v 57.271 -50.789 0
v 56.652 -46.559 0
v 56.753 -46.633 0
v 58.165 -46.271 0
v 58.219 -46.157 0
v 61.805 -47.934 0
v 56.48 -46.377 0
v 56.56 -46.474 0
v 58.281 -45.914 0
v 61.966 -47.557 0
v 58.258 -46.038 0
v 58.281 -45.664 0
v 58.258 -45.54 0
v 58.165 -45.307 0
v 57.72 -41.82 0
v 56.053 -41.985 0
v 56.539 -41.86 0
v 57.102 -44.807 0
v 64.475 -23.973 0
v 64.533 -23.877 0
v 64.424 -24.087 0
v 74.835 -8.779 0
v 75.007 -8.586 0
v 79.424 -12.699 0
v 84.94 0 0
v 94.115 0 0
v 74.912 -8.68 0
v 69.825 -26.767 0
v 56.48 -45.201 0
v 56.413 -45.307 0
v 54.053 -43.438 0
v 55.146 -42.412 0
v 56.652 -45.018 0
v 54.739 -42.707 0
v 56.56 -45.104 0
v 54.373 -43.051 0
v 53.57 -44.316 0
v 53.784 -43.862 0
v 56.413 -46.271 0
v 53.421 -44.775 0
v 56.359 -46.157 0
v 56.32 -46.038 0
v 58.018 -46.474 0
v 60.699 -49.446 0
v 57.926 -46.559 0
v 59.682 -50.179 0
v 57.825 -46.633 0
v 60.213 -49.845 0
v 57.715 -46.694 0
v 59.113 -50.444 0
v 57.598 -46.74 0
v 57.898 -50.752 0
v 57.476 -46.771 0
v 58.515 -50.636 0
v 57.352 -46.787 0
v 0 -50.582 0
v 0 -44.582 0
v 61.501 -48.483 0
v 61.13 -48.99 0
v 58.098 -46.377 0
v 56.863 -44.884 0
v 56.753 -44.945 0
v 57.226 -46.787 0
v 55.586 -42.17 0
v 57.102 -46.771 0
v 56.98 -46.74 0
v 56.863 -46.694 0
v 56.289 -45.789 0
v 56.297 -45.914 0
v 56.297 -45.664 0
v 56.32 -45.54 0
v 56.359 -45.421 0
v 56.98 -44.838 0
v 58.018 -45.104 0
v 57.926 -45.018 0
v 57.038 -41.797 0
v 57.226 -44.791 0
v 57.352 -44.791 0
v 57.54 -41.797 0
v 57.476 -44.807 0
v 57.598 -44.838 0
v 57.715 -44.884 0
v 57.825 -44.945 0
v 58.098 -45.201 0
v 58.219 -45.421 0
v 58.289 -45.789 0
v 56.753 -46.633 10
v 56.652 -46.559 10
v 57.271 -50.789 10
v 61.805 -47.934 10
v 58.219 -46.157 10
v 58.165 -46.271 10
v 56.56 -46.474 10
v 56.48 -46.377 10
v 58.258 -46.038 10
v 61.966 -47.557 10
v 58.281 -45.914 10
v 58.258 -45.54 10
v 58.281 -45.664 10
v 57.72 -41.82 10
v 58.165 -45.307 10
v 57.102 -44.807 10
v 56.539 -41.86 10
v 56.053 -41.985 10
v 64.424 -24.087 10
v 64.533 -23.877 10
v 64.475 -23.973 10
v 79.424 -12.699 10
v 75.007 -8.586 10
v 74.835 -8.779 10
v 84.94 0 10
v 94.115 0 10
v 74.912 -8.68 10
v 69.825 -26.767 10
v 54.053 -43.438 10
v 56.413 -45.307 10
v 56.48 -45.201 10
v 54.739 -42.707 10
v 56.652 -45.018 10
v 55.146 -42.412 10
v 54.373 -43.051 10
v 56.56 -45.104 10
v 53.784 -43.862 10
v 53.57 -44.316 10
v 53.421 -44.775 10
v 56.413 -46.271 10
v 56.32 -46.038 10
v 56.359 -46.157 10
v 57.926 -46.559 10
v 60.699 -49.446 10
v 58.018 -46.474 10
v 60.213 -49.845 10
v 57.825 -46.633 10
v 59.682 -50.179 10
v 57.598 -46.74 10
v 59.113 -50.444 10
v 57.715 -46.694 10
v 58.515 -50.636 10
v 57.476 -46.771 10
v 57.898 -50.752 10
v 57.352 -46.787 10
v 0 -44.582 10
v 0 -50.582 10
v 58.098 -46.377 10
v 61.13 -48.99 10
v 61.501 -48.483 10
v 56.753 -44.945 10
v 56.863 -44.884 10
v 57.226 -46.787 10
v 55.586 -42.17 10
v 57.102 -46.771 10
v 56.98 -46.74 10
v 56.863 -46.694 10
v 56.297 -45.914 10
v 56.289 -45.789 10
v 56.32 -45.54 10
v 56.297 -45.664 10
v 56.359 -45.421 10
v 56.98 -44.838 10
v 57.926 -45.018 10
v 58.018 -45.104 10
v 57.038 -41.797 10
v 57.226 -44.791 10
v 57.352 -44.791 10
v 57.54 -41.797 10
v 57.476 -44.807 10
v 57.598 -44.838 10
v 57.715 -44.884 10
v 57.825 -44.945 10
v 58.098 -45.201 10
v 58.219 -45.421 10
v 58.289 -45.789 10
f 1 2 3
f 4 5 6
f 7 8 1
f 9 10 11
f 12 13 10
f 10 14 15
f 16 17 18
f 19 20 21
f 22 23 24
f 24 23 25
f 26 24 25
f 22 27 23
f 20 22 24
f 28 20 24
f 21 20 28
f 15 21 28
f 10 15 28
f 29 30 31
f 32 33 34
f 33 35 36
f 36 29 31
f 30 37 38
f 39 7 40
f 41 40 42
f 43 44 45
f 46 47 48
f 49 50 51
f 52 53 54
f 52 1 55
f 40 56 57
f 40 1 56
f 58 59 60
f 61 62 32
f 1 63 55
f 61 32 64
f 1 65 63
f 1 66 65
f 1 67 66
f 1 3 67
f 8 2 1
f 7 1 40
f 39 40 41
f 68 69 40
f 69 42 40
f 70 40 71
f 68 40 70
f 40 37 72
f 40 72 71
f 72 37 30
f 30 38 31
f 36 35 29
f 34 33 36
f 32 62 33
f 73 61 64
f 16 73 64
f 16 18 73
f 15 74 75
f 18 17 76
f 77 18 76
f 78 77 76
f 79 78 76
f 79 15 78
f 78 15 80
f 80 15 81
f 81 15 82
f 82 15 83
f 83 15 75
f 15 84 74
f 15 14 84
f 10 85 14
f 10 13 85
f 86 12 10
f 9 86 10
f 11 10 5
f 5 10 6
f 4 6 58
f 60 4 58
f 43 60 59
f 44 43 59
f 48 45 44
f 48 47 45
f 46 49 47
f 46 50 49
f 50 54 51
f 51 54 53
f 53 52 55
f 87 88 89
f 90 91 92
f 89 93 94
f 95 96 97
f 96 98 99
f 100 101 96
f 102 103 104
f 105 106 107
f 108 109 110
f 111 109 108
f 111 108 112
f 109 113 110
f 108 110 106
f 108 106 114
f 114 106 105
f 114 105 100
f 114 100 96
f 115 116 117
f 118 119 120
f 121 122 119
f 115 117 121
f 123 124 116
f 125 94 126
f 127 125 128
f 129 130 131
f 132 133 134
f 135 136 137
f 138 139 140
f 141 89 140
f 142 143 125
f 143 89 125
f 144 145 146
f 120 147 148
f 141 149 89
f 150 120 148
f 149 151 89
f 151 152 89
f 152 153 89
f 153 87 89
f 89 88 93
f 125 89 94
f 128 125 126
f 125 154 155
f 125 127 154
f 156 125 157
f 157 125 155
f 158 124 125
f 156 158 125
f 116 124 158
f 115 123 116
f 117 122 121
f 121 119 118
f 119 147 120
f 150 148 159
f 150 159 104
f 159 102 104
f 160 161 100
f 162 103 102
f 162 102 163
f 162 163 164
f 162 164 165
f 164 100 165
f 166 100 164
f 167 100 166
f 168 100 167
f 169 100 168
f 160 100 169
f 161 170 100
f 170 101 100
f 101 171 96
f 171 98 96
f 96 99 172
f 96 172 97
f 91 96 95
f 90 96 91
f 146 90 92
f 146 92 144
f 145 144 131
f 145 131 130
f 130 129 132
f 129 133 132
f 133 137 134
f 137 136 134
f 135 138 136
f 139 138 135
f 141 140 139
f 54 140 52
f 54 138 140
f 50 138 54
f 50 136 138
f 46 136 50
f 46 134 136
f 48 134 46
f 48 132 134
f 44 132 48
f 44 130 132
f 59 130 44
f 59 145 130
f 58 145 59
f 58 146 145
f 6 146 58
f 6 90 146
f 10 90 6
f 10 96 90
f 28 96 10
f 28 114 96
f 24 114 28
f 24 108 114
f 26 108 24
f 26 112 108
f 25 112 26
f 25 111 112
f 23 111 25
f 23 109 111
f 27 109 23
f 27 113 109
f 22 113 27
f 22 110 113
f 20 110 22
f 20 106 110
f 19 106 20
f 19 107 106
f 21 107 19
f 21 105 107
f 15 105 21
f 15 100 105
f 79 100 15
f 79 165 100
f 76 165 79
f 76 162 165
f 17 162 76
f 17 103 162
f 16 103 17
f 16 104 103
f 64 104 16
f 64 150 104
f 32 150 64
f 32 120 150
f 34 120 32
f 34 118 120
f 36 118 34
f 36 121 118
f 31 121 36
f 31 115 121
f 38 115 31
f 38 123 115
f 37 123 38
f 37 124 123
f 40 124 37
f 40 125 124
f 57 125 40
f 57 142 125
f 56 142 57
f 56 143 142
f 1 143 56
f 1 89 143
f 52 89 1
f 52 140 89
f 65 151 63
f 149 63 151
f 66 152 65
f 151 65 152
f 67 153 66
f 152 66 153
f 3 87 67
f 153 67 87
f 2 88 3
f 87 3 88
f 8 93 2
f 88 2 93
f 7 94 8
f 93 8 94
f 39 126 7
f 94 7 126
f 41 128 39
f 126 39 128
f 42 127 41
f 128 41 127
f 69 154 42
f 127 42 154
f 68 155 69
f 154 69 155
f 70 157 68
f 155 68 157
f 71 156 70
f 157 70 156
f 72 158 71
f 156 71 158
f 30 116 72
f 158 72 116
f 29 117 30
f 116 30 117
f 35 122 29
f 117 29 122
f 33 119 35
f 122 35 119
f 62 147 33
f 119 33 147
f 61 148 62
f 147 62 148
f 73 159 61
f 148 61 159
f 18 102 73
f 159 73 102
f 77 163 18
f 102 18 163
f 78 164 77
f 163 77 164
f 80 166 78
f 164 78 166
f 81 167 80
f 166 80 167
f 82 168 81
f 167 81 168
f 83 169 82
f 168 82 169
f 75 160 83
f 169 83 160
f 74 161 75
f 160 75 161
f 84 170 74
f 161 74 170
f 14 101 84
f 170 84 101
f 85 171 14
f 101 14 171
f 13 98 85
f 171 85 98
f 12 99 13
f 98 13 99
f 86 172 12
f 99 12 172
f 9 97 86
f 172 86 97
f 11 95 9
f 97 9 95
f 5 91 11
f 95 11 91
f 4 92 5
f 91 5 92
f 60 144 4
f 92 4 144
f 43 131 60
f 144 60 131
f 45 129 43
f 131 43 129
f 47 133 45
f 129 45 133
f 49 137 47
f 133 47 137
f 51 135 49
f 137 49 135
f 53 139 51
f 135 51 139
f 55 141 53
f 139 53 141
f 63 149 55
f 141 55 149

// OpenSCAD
// file: ../../../../../hardware/openscad/keyboard-builder.scad
// -*- mode: c -*-


// All distances are in mm.


// ********** CONSTANTS **********
keycap_size             = 18;
mx_hole_size            = 13.97;
mx_notch_width          = 3.5001;
mx_notch_offset         = 4.2545;
mx_notch_depth          = 0.8128;


// ********** GLOBAL VARIABLES **********
DEBUG                   = true;
mx_notched_holes        = true;



// ********** MODULES **********


module mx_switch_hole() {
    // Cherry MX switch hole with the center at `position`.
    // Sizes come from the ErgoDox design.

    union() {
        square([mx_hole_size, mx_hole_size], center=true);
        if (mx_notched_holes) {
            translate([0, mx_notch_offset]) {
                square([mx_hole_size + 2 * mx_notch_depth, mx_notch_width], center=true);
            }
            translate([0, -mx_notch_offset]) {
                square([mx_hole_size + 2 * mx_notch_depth, mx_notch_width], center=true);
            }
        }
    }
//    _debug_rectangle(keycap_size * keycap[0] + floor(keycap[0] - 1), keycap_size * keycap[1] + floor(keycap[1] - 1));
}


module keycap(keycap) {
    width = keycap_size * keycap[0] + floor(keycap[0] - 1);
    height = keycap_size * keycap[1] + floor(keycap[1] - 1);
    square([width, height], center=true);
}


module quadrant_split(origin, quadrant_number) {
    translate(origin) {
        intersection() {
            translate(-origin) {
                children();
            }
            rotate([0, 0, quadrant_number * 90]) {
                square([1000, 1000]);
            }
        }
    }
}
// main file
include <dmach76.scad>;

linear_extrude(height=10)
quadrant_split([0, 0], 3)
union() {difference() {offset(r=5) bottom_plate(); offset(r=-1) bottom_plate(); screw_holes(); }; screw_washers(); }
